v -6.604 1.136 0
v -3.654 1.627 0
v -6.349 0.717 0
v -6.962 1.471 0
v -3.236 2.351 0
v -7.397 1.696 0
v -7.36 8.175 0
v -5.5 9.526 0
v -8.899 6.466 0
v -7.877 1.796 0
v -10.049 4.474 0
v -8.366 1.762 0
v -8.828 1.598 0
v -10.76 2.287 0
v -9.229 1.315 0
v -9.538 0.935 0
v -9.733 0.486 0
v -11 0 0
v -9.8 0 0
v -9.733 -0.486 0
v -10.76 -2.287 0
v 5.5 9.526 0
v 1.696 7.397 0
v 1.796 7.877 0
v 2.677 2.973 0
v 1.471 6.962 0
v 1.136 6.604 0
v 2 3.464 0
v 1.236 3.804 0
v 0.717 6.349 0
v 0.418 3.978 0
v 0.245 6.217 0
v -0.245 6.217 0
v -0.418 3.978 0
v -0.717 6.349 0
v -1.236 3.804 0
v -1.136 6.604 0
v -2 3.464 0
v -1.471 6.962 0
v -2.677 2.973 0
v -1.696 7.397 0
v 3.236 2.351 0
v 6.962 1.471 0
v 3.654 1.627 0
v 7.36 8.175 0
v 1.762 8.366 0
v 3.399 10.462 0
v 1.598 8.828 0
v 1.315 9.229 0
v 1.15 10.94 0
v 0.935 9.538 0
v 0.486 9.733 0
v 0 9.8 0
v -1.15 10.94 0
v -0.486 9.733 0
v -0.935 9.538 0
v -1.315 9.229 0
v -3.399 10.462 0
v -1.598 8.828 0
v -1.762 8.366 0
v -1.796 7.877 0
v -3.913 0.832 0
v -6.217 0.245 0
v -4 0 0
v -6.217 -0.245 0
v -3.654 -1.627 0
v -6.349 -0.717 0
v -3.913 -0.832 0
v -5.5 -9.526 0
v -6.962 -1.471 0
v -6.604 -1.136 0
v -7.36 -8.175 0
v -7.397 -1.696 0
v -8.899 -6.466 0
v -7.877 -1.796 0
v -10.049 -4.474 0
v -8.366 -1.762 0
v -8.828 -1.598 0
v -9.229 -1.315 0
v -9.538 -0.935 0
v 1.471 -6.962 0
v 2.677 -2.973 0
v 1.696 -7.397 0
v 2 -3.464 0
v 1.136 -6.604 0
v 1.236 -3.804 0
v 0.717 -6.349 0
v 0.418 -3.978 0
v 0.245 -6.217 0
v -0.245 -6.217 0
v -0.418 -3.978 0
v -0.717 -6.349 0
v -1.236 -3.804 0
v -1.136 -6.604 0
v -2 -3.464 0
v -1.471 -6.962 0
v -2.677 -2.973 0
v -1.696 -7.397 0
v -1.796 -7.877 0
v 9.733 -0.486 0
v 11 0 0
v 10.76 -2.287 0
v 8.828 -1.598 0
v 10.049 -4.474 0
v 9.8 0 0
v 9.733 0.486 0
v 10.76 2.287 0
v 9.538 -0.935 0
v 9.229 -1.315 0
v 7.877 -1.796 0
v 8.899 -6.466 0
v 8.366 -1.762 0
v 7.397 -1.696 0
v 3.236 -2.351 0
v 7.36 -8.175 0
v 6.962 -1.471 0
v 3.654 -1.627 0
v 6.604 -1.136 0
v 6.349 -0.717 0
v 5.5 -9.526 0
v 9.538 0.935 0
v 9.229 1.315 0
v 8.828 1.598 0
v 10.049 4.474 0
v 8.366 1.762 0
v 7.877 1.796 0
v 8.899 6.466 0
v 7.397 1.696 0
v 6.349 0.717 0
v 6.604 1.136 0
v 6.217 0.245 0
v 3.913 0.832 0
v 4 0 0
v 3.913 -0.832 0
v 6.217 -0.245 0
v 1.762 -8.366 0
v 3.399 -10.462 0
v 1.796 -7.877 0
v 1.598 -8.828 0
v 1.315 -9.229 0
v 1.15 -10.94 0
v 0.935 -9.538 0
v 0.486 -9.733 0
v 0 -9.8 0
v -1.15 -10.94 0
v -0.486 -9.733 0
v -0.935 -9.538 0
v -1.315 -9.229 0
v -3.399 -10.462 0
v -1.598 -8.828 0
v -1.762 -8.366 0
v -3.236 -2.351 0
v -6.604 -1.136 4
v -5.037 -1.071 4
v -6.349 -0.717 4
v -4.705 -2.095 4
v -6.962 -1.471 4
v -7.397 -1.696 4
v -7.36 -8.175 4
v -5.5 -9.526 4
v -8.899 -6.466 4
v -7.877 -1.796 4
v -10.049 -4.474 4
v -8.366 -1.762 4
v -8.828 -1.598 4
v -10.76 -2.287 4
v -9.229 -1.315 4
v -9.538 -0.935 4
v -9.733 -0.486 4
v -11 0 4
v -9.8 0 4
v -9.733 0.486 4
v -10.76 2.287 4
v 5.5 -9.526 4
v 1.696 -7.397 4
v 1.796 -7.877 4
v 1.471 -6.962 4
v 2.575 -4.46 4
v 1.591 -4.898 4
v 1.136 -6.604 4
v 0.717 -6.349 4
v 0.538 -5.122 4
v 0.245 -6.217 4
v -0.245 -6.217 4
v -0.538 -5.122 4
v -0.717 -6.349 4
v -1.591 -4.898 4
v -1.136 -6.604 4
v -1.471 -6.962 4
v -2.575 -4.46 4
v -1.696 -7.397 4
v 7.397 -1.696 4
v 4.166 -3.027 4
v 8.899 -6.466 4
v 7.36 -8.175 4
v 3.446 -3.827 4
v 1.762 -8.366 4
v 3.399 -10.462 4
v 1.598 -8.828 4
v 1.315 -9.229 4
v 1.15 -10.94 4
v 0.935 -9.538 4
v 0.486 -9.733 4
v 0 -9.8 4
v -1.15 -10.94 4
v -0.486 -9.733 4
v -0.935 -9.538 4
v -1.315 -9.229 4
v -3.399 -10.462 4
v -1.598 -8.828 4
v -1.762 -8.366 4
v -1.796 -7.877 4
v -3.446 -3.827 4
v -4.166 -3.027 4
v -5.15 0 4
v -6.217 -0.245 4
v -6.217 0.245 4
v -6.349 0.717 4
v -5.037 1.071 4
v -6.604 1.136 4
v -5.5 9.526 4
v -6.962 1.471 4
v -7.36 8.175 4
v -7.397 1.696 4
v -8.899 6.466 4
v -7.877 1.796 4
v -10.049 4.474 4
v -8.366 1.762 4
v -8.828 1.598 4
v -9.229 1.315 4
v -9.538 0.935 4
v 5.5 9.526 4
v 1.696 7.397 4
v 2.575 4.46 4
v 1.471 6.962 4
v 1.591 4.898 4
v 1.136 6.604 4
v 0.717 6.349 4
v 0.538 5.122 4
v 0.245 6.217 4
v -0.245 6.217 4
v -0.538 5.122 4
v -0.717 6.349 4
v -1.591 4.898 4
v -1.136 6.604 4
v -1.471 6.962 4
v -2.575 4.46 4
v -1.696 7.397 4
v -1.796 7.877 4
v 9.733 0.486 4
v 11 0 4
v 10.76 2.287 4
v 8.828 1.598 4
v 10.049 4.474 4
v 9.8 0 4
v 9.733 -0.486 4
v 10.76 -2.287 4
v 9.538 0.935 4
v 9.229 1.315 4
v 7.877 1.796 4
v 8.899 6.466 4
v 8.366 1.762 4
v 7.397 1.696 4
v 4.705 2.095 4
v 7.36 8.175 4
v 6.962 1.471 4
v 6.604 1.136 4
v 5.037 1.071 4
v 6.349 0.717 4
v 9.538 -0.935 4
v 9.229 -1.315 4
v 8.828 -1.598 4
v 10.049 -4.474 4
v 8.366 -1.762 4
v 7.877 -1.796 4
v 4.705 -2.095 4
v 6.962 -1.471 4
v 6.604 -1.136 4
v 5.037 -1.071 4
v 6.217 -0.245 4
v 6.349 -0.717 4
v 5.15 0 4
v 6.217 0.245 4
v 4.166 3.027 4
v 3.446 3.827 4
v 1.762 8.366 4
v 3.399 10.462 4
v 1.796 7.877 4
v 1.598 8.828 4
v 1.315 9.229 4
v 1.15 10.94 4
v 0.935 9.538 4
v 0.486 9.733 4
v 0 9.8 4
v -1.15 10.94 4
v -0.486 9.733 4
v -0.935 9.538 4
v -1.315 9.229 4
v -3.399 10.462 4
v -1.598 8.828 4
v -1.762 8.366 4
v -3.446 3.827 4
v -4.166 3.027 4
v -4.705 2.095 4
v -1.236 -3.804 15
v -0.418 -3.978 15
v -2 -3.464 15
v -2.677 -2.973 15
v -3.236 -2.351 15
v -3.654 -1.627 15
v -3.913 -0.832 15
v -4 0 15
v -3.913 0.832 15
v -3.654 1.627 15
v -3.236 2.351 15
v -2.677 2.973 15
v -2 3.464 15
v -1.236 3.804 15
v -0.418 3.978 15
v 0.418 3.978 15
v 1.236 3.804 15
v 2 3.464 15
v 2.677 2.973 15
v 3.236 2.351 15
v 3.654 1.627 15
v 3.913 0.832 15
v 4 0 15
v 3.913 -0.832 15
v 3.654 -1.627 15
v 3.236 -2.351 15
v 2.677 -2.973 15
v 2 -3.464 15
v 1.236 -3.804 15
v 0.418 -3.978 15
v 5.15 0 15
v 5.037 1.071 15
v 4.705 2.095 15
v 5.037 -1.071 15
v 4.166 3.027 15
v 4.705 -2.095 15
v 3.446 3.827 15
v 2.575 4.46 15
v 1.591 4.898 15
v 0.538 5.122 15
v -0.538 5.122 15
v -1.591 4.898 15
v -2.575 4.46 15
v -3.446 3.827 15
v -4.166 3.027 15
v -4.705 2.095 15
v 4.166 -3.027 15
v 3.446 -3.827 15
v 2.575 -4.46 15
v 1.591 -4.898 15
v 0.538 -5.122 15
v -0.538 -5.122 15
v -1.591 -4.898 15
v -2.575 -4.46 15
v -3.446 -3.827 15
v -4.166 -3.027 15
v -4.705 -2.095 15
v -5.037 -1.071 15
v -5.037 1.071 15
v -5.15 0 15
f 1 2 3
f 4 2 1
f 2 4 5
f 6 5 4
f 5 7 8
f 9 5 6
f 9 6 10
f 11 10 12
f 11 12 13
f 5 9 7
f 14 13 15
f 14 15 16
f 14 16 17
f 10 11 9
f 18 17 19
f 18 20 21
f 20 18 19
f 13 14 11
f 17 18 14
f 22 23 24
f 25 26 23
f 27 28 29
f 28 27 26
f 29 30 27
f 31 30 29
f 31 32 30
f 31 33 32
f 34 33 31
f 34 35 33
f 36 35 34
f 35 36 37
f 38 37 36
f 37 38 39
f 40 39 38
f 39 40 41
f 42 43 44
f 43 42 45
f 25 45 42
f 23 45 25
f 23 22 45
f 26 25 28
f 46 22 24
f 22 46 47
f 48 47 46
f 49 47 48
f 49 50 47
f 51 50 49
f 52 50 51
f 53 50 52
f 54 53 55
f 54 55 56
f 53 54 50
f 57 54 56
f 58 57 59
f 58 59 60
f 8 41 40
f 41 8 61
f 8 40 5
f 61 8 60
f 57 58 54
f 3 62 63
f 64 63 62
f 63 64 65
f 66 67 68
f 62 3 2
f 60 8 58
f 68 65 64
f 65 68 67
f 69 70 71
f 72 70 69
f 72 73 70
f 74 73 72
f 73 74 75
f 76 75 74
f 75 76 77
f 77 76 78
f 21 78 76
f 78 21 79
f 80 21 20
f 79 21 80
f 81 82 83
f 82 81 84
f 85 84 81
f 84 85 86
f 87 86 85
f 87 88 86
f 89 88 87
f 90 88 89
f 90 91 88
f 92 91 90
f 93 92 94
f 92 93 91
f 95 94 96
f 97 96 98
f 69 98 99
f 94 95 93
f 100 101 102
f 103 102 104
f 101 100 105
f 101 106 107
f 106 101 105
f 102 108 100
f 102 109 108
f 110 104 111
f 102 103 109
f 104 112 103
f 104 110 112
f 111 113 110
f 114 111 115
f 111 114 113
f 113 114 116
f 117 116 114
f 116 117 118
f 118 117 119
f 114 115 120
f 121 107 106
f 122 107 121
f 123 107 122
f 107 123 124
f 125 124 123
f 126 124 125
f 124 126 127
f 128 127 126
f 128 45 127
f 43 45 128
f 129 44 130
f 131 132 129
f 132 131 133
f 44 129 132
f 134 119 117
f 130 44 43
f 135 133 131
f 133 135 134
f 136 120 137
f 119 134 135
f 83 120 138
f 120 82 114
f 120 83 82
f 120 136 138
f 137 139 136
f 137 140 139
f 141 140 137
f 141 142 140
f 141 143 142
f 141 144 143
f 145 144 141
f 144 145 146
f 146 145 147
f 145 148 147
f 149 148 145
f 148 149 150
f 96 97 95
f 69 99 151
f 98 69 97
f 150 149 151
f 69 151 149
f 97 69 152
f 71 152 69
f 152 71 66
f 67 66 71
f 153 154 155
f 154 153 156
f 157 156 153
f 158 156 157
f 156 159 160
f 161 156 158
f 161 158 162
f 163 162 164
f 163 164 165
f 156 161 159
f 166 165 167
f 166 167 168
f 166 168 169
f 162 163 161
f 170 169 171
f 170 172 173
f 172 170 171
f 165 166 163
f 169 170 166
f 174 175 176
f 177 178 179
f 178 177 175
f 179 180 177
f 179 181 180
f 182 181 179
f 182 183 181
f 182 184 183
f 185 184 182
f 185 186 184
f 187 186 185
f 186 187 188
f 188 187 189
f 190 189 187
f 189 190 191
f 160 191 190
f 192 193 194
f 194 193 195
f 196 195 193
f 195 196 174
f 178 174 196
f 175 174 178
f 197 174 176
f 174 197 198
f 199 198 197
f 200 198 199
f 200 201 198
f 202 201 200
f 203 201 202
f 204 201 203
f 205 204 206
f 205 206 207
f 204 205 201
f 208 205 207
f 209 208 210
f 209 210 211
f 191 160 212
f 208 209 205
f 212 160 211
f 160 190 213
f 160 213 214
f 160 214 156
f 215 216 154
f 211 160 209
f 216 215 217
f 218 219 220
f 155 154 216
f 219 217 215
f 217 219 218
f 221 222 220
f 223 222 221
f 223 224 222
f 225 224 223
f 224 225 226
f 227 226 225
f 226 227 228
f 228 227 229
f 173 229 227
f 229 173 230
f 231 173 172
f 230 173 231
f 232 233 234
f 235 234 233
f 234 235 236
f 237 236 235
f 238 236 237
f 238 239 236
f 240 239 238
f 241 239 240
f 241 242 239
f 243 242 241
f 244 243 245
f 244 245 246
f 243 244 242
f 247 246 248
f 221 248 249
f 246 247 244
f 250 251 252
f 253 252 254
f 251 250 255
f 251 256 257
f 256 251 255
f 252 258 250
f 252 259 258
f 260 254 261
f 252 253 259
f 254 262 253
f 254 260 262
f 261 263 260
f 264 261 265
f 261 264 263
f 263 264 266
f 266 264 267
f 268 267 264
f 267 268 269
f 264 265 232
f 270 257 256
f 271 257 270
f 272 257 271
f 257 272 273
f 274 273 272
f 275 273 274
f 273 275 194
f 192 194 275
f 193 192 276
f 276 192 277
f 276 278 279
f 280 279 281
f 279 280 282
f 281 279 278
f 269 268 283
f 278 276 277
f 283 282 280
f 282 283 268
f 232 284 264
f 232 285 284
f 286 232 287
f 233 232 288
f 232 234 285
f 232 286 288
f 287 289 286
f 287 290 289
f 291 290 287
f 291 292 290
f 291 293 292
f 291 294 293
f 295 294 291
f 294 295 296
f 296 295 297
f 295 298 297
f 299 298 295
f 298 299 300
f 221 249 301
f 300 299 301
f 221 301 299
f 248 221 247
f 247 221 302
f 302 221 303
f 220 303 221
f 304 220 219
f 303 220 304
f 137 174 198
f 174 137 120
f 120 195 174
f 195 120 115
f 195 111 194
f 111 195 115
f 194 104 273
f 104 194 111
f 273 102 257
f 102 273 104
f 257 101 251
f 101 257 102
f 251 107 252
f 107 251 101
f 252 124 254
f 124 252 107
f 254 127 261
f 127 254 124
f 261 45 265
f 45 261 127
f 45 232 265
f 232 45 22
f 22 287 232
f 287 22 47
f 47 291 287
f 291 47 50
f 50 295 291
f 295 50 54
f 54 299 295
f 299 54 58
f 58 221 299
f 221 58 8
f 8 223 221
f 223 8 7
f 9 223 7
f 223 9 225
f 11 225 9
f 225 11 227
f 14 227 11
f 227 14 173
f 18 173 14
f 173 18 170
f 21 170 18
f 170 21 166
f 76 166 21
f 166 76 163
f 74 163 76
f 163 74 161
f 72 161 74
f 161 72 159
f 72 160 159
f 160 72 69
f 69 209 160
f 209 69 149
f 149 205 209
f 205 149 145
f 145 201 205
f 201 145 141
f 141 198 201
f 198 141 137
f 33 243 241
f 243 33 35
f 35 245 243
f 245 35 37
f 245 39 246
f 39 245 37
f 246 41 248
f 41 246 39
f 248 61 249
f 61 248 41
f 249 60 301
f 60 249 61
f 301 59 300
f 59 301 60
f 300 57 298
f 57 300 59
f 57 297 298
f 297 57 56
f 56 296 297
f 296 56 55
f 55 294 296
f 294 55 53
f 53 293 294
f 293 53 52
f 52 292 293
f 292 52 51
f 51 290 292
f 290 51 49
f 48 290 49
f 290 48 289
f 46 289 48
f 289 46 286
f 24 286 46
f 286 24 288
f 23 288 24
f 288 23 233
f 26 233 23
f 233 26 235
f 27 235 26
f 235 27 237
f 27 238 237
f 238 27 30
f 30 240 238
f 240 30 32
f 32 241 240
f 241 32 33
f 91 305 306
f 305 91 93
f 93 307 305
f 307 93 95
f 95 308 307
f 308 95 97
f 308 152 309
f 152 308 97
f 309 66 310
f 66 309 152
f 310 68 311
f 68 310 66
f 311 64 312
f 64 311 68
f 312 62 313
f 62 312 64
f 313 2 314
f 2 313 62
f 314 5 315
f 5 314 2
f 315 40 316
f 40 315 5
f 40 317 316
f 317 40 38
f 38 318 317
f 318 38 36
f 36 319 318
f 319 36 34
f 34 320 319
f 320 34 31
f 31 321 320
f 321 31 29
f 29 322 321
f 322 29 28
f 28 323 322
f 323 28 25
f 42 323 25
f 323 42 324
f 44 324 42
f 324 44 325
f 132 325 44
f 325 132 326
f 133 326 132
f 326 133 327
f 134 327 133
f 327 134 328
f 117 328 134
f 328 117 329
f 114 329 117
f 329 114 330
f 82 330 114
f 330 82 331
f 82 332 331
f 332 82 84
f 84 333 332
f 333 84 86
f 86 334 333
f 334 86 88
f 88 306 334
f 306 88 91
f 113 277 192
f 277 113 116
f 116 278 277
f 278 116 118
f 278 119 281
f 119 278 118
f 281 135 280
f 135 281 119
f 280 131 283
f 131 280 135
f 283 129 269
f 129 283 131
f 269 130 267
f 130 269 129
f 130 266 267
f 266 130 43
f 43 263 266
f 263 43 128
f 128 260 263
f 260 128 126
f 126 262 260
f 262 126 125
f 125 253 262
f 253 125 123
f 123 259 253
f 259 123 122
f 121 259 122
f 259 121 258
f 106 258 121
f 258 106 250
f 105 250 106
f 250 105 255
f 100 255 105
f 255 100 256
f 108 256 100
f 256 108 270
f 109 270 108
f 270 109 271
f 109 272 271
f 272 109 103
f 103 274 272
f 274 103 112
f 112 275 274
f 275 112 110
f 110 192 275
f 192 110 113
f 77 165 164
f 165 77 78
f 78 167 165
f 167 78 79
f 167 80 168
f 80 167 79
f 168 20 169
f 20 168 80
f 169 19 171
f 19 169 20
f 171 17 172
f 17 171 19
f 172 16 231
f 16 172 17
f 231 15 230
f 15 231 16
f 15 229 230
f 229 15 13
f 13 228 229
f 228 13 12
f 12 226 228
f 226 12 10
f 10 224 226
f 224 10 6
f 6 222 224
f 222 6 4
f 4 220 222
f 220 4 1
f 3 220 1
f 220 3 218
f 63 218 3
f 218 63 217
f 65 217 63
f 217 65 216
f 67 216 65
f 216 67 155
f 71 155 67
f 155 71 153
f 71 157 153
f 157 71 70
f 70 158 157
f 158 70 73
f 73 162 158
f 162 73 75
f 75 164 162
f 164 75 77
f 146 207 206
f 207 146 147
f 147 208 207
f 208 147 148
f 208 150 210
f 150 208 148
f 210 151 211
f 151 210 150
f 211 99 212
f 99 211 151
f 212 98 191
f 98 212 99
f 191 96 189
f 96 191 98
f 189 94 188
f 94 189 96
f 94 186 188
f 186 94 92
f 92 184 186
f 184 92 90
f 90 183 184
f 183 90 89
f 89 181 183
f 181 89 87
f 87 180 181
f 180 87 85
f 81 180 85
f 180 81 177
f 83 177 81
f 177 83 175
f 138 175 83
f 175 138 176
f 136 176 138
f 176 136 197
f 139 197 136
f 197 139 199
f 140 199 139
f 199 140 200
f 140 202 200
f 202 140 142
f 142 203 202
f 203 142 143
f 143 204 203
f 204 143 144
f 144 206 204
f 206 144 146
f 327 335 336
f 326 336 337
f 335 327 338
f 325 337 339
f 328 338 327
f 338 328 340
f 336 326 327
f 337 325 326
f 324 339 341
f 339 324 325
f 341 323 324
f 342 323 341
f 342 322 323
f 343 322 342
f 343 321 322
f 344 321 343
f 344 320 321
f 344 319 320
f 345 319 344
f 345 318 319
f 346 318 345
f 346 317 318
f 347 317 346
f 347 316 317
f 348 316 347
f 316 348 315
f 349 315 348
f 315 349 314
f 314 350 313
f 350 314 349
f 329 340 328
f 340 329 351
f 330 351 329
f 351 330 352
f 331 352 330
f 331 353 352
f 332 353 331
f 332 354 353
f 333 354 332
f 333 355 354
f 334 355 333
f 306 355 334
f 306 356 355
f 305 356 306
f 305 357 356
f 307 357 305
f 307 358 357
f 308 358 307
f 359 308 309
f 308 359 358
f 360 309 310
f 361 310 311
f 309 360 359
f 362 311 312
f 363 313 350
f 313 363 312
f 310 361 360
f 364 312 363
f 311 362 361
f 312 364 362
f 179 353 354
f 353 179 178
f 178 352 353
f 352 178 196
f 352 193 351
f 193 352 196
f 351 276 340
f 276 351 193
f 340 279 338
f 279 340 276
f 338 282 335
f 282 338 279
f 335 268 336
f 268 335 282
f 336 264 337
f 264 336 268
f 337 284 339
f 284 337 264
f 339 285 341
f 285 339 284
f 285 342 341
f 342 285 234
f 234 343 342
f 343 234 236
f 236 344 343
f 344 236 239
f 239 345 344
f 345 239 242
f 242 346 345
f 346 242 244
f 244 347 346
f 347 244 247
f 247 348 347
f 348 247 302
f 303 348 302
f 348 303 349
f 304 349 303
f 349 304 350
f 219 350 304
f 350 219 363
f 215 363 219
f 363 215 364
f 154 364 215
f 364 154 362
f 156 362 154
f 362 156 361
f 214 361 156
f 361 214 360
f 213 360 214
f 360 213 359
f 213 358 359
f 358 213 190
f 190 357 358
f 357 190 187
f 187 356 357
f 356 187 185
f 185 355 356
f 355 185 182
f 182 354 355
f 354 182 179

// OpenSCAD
// file: ThreadBase.scad
function hex_cap_screw_dk(mSize) = lookup(
    mSize,
    [   [2,3.98],
        [2.5,4.68],
        [3,5.68],
        [4,7.22],
        [5,8.72],
        [6,10.22],
        [8,13.27],
        [10,16.27],
        [12,18.27]]);

function nut_s(mSize) = lookup(
    mSize,
    [   [ 2  , 4  ],
        [ 2.5, 5  ],
        [ 3  , 5.5],
        [ 4  , 7  ],
        [ 5  , 8  ],
        [ 6  ,10  ],
        [ 8  ,13  ],
        [10  ,17  ],
        [12  ,19  ]]);

function lock_nut_h(mSize) = lookup(
    mSize,
    [   [ 2  , 2.8],
        [ 2.5, 3  ],
        [ 3  , 3.9],
        [ 4  , 5  ],
        [ 5  , 5  ],
        [ 6  , 5.9],
        [ 8  , 7.9],
        [10  , 9.8],
        [12  ,12  ]]);

function nut_m(mSize) = lookup(
    mSize,
    [   [ 2  , 1.6],
        [ 2.5, 2  ],
        [ 3  , 2.4],
        [ 4  , 3.2],
        [ 5  , 4  ],
        [ 6  , 5  ],
        [ 8  , 6.5],
        [10  , 8  ],
        [12  ,10  ]]);

function bolt_s(mSize) = nut_s(mSize);


function bolt_k(mSize) = lookup(
    mSize,
    [   [ 3, 2.12],
        [ 4, 2.92],
        [ 5, 3.65],
        [ 6, 4.15],
        [ 8, 5.45],
        [10, 6.58],
        [12, 7.68]]);


function bolt_b(mSize, L) = let (
bolt_b_values = [   
    [ 3,[12]],
    [ 4,[14]],
    [ 5,[16,22]],
    [ 6,[18,24]],
    [ 8,[22,28]],
    [10,[26,32,45]],
    [12,[30,36,49]]]) bolt_b_values[search(mSize,bolt_b_values)[0]][1][L>200?2:(L>125?1:0)];

function pitch(mSize) = lookup(
    mSize,
    [   [2,0.4],
        [2.5,0.45],
        [3,0.5],
        [4,0.7],
        [5,0.8],
        [6,1],
        [8,1.25],
        [10,1.5],
        [12,1.75],
        [14,2],
        [16,2],
        [18,2.5],
        [20,2.5]]);

module nut_profile(mSize = 5, axis = "z", revDir = false)
{
    orient_to_axis(axis = axis, revDir = revDir)
    {
        d = nut_s(mSize)/sin(60);
        points = [for (a = [60:60:360]) d/2 * [cos(a), sin(a)]]; 
        polygon(points);
    }
}

inch = 25.4;

function bsp_tpi(iSize) = lookup(
    iSize,
    [   [1/16,28],
        [1/8,28],
        [1/4,19],
        [3/8,19],
        [1/2,14],
        [3/4,14],
        [1,11],
        [1.25,11],
        [1.5,11],
        [2,11],
        [2.5,11],
        [3,11],
        [4,11],
        [5,11],
        [6,11]]);

function bsp_pitch(iSize) = inch/bsp_tpi(iSize);

function bsp_d_major(iSize) = lookup(
    iSize,
    [   [1/16,7.723],
        [1/8,9.728],
        [1/4,13.157],
        [3/8,16.662],
        [1/2,20.995],
        [3/4,26.441],
        [1,33.249],
        [1.25,41.910],
        [1.5,47.803],
        [2,59.614],
        [2.5,75.184],
        [3,87.884],
        [4,113.03],
        [5,138.430],
        [6,163.830]]);

function bsp_h_v(iSize) = bsp_pitch(iSize)/(2*tan(55/2));

function bsp_h_basic(iSize) = 2*bsp_h_v(iSize)/3;

function bsp_d_minor(iSize) = bsp_d_major(iSize)-2*bsp_h_basic(iSize);

module orient_to_axis(axis = "x", revDir = false)
{
    if (axis=="x")
    {
        rotate(a = 90, v = [0,1,0]) orient_to_axis(axis = "z",revDir=revDir) {children();};
    }
    else if (axis=="y")
    {
        rotate(a = -90, v = [1,0,0]) orient_to_axis(axis = "z",revDir=revDir) {children();};
    }
    else if (axis=="z")
    {
        rotate(a = revDir ? 180 : 0, v = [1,0,0]) {children();}
    }
    else
    {
        assert(false,str("unknown axis ",axis));
    }
}
// file: ThreadExtrude.scad
use <ThreadBase.scad>;

inch = 25.4;

function bsp_profile(iSize) = 
    let (h = bsp_h_basic(iSize), y = bsp_h_basic(iSize)*tan(55/2), p = bsp_pitch(iSize), d = bsp_d_major(iSize)) [
        [d/2-1.5*h,0],
        [d/2-h,0],
        [d/2-h,p/4-y/2],
        [d/2,p/4+y/2],
        [d/2,3*p/4-y/2],
        [d/2-h,3*p/4+y/2],
        [d/2-h,p],
        [d/2-1.5*h,p]
    ];

function metric_profile(d = 10, pitch = 1.5) = 
    let (h = pitch*sqrt(3)/2) [
        [d/2-5*h/8,pitch/8], 
        [d/2,7*pitch/16], 
        [d/2,9*pitch/16], 
        [d/2-5*h/8,7*pitch/8]
    ];

/*
function metric_profile(d = 10, pitch = 1.5) = 
    let (h = pitch*sqrt(3)/2) [
        [d/2-7*h/8,0],
        [d/2-5*h/8,0],
        [d/2-5*h/8,pitch/8], 
        [d/2,7*pitch/16], 
        [d/2,9*pitch/16], 
        [d/2-5*h/8,7*pitch/8],
        [d/2-5*h/8,pitch],
        [d/2-7*h/8,pitch]
    ];
*/

function metric_d_min(d = 10, pitch = 1.5) = d-sqrt(3)*5/8*pitch+0.1*pitch;

function fragments() = $fn < 18 ? 18 : $fn;

module thread_segment(threadProfilePolygon = metric_profile(), pitch = 2)
{
    for (v = threadProfilePolygon)
    {
        assert(v[0] > 0, "All points of thread profile polygon must have positive x values");
    }
    polPoints = len(threadProfilePolygon);
    assert(polPoints > 0, "Thread profile polygon must have at least 3 points");
    fn = fragments();
    faces = concat(
        [[for (j = [1:polPoints]) polPoints-j]], 
        [[for (j = [0:polPoints-1]) polPoints+j]],
        [for (j = [0:polPoints-1]) [j,(j+1) % polPoints,((j+1) % polPoints)+polPoints,j+polPoints]]);
    //multiplication by 1.001 ensures, that segments overlap by 0.1 % anglewise
    points = concat(
        [for (v = threadProfilePolygon) [v[0],0,v[1]]],
        [for (v = threadProfilePolygon) [cos(1.001*360/fn)*v[0],sin(1.001*360/fn)*v[0],v[1]+pitch/fn]]);
    polyhedron(faces = faces, points = points);    
}

*thread_segment($fn = 72);

module thread_extrude(threadProfilePolygon = metric_profile(), pitch = 1.5, angle = 720)
{
    fn = fragments();
    segmentCount = ceil(fn*angle/360);
    assert(segmentCount > 0, "Angle must be positive")
    for (i = [0:segmentCount-1])
    {
        rotate(a = i*360/fn) 
        {
            translate([0,0,i*pitch/fn]) 
            {
                thread_segment(threadProfilePolygon = threadProfilePolygon, pitch = pitch);
            }
        }
    }
}

module metric_thread(d = 10, pitch = 1.5, h = 15)
{
    assert(pitch!=0, "Pitch cannot be 0");
    assert(h > 0, "Height must be positive");
    intersection()
    {
        translate([0,0,-pitch]) {thread_extrude(metric_profile(d, pitch), pitch, 360*h/pitch+360);}
        cylinder(d = d, h = h);
    }
}

module bspp_thread(iSize = 1/4, h = 20)
{
    assert(h > 0, "Height must be positive");
    intersection()
    {
        pitch = bsp_pitch(iSize);
        translate([0,0,-pitch]) {thread_extrude(bsp_profile(iSize), pitch, 360*h/pitch+360);}
        cylinder(d = bsp_d_major(iSize), h = h);
    }
}

*thread_extrude($fn = 36, angle = 3600);

*metric_thread(h = 3, $fn = 36);

*translate([0,0,20]) {metric_thread(pitch = -1.5, h = 3, $fn = 36);}
*difference()
{
    translate([0,0,-1]) {cylinder(d = 12, h = 6);}
    translate([0,0,-1]) {cylinder(d = 8, h = 7);}
    thread_extrude($fn = 36);
}

pitch = 1.5;
for (i = [0:3])
{
    translate([0,0,i*pitch]) {render() {thread_extrude(pitch = pitch, angle = 360, $fn = 72);}}
}
// main file
use <ThreadExtrude.scad>;

$fs = 0.5;

module T8_lead_screw(l)
{
    color("gray") {cylinder(d = 8, l);}
    //TO-DO: perhaps make thread
}

module T8_cyl_nut_flange()
{
    linear_extrude(4) 
    {
        difference()
        {
            circle(d = 22);
            circle(d = 8);
            for (a = [0:90:270])
            {
                rotate(a) {translate([8,0]) {circle(d = 3.6);}}
            }
        }
    }
}

module T8_cyl_anti_backlash_nut_a()
{
    T8_cyl_nut_flange();
    translate([0,0,4]) {linear_extrude(7) {difference() {circle(d = 10.3);circle(d = 8);}}}
    translate([0,0,11]) 
    {
        linear_extrude(4) 
        {
            difference() 
            {
                circle(d = 10.3);
                circle(d = 8);
                square([10.3,3.8],center = true);
            }
        }
    }
}

module T8_cyl_anti_backlash_nut_b()
{
    linear_extrude(4)
    {
        intersection()
        {
            square([10.3,3.6],center = true);
            difference()
            {
                circle(d = 10.3);
                circle(d = 8);
            }
        }
    }
    translate([0,0,4]) linear_extrude(7) {difference() {circle(d = 10.3);circle(d = 8);}}
    translate([0,0,11]) linear_extrude(4) {{difference() {circle(d = 14);circle(d = 8);}}}
}

module spring(D = 11, d = 1, h = 19, turns = 6)
{
    render()
    {
        hex = [for (i = [0:5]) 0.5*[D+d*sin(i*60),d*cos(i*60)]];
        for (z = [0,h]) 
        {
            translate([0,0,z]) {rotate_extrude() {polygon(hex);}}
        }
        thread_extrude(hex,h/turns,turns*360);
    }
}

module T8_cyl_anti_backlash_nut()
{
    T8_cyl_anti_backlash_nut_a();
    translate([0,0,13]) {T8_cyl_anti_backlash_nut_b();}
    translate([0,0,4.5]) {color("gray") {spring(11,1,19,6);}}
}

module T8_cyl_nut()
{
    T8_cyl_nut_flange();
    translate([0,0,4]) {linear_extrude(11) {difference() {circle(d = 10.3);circle(d = 8);}}}
}

T8_cyl_nut();
